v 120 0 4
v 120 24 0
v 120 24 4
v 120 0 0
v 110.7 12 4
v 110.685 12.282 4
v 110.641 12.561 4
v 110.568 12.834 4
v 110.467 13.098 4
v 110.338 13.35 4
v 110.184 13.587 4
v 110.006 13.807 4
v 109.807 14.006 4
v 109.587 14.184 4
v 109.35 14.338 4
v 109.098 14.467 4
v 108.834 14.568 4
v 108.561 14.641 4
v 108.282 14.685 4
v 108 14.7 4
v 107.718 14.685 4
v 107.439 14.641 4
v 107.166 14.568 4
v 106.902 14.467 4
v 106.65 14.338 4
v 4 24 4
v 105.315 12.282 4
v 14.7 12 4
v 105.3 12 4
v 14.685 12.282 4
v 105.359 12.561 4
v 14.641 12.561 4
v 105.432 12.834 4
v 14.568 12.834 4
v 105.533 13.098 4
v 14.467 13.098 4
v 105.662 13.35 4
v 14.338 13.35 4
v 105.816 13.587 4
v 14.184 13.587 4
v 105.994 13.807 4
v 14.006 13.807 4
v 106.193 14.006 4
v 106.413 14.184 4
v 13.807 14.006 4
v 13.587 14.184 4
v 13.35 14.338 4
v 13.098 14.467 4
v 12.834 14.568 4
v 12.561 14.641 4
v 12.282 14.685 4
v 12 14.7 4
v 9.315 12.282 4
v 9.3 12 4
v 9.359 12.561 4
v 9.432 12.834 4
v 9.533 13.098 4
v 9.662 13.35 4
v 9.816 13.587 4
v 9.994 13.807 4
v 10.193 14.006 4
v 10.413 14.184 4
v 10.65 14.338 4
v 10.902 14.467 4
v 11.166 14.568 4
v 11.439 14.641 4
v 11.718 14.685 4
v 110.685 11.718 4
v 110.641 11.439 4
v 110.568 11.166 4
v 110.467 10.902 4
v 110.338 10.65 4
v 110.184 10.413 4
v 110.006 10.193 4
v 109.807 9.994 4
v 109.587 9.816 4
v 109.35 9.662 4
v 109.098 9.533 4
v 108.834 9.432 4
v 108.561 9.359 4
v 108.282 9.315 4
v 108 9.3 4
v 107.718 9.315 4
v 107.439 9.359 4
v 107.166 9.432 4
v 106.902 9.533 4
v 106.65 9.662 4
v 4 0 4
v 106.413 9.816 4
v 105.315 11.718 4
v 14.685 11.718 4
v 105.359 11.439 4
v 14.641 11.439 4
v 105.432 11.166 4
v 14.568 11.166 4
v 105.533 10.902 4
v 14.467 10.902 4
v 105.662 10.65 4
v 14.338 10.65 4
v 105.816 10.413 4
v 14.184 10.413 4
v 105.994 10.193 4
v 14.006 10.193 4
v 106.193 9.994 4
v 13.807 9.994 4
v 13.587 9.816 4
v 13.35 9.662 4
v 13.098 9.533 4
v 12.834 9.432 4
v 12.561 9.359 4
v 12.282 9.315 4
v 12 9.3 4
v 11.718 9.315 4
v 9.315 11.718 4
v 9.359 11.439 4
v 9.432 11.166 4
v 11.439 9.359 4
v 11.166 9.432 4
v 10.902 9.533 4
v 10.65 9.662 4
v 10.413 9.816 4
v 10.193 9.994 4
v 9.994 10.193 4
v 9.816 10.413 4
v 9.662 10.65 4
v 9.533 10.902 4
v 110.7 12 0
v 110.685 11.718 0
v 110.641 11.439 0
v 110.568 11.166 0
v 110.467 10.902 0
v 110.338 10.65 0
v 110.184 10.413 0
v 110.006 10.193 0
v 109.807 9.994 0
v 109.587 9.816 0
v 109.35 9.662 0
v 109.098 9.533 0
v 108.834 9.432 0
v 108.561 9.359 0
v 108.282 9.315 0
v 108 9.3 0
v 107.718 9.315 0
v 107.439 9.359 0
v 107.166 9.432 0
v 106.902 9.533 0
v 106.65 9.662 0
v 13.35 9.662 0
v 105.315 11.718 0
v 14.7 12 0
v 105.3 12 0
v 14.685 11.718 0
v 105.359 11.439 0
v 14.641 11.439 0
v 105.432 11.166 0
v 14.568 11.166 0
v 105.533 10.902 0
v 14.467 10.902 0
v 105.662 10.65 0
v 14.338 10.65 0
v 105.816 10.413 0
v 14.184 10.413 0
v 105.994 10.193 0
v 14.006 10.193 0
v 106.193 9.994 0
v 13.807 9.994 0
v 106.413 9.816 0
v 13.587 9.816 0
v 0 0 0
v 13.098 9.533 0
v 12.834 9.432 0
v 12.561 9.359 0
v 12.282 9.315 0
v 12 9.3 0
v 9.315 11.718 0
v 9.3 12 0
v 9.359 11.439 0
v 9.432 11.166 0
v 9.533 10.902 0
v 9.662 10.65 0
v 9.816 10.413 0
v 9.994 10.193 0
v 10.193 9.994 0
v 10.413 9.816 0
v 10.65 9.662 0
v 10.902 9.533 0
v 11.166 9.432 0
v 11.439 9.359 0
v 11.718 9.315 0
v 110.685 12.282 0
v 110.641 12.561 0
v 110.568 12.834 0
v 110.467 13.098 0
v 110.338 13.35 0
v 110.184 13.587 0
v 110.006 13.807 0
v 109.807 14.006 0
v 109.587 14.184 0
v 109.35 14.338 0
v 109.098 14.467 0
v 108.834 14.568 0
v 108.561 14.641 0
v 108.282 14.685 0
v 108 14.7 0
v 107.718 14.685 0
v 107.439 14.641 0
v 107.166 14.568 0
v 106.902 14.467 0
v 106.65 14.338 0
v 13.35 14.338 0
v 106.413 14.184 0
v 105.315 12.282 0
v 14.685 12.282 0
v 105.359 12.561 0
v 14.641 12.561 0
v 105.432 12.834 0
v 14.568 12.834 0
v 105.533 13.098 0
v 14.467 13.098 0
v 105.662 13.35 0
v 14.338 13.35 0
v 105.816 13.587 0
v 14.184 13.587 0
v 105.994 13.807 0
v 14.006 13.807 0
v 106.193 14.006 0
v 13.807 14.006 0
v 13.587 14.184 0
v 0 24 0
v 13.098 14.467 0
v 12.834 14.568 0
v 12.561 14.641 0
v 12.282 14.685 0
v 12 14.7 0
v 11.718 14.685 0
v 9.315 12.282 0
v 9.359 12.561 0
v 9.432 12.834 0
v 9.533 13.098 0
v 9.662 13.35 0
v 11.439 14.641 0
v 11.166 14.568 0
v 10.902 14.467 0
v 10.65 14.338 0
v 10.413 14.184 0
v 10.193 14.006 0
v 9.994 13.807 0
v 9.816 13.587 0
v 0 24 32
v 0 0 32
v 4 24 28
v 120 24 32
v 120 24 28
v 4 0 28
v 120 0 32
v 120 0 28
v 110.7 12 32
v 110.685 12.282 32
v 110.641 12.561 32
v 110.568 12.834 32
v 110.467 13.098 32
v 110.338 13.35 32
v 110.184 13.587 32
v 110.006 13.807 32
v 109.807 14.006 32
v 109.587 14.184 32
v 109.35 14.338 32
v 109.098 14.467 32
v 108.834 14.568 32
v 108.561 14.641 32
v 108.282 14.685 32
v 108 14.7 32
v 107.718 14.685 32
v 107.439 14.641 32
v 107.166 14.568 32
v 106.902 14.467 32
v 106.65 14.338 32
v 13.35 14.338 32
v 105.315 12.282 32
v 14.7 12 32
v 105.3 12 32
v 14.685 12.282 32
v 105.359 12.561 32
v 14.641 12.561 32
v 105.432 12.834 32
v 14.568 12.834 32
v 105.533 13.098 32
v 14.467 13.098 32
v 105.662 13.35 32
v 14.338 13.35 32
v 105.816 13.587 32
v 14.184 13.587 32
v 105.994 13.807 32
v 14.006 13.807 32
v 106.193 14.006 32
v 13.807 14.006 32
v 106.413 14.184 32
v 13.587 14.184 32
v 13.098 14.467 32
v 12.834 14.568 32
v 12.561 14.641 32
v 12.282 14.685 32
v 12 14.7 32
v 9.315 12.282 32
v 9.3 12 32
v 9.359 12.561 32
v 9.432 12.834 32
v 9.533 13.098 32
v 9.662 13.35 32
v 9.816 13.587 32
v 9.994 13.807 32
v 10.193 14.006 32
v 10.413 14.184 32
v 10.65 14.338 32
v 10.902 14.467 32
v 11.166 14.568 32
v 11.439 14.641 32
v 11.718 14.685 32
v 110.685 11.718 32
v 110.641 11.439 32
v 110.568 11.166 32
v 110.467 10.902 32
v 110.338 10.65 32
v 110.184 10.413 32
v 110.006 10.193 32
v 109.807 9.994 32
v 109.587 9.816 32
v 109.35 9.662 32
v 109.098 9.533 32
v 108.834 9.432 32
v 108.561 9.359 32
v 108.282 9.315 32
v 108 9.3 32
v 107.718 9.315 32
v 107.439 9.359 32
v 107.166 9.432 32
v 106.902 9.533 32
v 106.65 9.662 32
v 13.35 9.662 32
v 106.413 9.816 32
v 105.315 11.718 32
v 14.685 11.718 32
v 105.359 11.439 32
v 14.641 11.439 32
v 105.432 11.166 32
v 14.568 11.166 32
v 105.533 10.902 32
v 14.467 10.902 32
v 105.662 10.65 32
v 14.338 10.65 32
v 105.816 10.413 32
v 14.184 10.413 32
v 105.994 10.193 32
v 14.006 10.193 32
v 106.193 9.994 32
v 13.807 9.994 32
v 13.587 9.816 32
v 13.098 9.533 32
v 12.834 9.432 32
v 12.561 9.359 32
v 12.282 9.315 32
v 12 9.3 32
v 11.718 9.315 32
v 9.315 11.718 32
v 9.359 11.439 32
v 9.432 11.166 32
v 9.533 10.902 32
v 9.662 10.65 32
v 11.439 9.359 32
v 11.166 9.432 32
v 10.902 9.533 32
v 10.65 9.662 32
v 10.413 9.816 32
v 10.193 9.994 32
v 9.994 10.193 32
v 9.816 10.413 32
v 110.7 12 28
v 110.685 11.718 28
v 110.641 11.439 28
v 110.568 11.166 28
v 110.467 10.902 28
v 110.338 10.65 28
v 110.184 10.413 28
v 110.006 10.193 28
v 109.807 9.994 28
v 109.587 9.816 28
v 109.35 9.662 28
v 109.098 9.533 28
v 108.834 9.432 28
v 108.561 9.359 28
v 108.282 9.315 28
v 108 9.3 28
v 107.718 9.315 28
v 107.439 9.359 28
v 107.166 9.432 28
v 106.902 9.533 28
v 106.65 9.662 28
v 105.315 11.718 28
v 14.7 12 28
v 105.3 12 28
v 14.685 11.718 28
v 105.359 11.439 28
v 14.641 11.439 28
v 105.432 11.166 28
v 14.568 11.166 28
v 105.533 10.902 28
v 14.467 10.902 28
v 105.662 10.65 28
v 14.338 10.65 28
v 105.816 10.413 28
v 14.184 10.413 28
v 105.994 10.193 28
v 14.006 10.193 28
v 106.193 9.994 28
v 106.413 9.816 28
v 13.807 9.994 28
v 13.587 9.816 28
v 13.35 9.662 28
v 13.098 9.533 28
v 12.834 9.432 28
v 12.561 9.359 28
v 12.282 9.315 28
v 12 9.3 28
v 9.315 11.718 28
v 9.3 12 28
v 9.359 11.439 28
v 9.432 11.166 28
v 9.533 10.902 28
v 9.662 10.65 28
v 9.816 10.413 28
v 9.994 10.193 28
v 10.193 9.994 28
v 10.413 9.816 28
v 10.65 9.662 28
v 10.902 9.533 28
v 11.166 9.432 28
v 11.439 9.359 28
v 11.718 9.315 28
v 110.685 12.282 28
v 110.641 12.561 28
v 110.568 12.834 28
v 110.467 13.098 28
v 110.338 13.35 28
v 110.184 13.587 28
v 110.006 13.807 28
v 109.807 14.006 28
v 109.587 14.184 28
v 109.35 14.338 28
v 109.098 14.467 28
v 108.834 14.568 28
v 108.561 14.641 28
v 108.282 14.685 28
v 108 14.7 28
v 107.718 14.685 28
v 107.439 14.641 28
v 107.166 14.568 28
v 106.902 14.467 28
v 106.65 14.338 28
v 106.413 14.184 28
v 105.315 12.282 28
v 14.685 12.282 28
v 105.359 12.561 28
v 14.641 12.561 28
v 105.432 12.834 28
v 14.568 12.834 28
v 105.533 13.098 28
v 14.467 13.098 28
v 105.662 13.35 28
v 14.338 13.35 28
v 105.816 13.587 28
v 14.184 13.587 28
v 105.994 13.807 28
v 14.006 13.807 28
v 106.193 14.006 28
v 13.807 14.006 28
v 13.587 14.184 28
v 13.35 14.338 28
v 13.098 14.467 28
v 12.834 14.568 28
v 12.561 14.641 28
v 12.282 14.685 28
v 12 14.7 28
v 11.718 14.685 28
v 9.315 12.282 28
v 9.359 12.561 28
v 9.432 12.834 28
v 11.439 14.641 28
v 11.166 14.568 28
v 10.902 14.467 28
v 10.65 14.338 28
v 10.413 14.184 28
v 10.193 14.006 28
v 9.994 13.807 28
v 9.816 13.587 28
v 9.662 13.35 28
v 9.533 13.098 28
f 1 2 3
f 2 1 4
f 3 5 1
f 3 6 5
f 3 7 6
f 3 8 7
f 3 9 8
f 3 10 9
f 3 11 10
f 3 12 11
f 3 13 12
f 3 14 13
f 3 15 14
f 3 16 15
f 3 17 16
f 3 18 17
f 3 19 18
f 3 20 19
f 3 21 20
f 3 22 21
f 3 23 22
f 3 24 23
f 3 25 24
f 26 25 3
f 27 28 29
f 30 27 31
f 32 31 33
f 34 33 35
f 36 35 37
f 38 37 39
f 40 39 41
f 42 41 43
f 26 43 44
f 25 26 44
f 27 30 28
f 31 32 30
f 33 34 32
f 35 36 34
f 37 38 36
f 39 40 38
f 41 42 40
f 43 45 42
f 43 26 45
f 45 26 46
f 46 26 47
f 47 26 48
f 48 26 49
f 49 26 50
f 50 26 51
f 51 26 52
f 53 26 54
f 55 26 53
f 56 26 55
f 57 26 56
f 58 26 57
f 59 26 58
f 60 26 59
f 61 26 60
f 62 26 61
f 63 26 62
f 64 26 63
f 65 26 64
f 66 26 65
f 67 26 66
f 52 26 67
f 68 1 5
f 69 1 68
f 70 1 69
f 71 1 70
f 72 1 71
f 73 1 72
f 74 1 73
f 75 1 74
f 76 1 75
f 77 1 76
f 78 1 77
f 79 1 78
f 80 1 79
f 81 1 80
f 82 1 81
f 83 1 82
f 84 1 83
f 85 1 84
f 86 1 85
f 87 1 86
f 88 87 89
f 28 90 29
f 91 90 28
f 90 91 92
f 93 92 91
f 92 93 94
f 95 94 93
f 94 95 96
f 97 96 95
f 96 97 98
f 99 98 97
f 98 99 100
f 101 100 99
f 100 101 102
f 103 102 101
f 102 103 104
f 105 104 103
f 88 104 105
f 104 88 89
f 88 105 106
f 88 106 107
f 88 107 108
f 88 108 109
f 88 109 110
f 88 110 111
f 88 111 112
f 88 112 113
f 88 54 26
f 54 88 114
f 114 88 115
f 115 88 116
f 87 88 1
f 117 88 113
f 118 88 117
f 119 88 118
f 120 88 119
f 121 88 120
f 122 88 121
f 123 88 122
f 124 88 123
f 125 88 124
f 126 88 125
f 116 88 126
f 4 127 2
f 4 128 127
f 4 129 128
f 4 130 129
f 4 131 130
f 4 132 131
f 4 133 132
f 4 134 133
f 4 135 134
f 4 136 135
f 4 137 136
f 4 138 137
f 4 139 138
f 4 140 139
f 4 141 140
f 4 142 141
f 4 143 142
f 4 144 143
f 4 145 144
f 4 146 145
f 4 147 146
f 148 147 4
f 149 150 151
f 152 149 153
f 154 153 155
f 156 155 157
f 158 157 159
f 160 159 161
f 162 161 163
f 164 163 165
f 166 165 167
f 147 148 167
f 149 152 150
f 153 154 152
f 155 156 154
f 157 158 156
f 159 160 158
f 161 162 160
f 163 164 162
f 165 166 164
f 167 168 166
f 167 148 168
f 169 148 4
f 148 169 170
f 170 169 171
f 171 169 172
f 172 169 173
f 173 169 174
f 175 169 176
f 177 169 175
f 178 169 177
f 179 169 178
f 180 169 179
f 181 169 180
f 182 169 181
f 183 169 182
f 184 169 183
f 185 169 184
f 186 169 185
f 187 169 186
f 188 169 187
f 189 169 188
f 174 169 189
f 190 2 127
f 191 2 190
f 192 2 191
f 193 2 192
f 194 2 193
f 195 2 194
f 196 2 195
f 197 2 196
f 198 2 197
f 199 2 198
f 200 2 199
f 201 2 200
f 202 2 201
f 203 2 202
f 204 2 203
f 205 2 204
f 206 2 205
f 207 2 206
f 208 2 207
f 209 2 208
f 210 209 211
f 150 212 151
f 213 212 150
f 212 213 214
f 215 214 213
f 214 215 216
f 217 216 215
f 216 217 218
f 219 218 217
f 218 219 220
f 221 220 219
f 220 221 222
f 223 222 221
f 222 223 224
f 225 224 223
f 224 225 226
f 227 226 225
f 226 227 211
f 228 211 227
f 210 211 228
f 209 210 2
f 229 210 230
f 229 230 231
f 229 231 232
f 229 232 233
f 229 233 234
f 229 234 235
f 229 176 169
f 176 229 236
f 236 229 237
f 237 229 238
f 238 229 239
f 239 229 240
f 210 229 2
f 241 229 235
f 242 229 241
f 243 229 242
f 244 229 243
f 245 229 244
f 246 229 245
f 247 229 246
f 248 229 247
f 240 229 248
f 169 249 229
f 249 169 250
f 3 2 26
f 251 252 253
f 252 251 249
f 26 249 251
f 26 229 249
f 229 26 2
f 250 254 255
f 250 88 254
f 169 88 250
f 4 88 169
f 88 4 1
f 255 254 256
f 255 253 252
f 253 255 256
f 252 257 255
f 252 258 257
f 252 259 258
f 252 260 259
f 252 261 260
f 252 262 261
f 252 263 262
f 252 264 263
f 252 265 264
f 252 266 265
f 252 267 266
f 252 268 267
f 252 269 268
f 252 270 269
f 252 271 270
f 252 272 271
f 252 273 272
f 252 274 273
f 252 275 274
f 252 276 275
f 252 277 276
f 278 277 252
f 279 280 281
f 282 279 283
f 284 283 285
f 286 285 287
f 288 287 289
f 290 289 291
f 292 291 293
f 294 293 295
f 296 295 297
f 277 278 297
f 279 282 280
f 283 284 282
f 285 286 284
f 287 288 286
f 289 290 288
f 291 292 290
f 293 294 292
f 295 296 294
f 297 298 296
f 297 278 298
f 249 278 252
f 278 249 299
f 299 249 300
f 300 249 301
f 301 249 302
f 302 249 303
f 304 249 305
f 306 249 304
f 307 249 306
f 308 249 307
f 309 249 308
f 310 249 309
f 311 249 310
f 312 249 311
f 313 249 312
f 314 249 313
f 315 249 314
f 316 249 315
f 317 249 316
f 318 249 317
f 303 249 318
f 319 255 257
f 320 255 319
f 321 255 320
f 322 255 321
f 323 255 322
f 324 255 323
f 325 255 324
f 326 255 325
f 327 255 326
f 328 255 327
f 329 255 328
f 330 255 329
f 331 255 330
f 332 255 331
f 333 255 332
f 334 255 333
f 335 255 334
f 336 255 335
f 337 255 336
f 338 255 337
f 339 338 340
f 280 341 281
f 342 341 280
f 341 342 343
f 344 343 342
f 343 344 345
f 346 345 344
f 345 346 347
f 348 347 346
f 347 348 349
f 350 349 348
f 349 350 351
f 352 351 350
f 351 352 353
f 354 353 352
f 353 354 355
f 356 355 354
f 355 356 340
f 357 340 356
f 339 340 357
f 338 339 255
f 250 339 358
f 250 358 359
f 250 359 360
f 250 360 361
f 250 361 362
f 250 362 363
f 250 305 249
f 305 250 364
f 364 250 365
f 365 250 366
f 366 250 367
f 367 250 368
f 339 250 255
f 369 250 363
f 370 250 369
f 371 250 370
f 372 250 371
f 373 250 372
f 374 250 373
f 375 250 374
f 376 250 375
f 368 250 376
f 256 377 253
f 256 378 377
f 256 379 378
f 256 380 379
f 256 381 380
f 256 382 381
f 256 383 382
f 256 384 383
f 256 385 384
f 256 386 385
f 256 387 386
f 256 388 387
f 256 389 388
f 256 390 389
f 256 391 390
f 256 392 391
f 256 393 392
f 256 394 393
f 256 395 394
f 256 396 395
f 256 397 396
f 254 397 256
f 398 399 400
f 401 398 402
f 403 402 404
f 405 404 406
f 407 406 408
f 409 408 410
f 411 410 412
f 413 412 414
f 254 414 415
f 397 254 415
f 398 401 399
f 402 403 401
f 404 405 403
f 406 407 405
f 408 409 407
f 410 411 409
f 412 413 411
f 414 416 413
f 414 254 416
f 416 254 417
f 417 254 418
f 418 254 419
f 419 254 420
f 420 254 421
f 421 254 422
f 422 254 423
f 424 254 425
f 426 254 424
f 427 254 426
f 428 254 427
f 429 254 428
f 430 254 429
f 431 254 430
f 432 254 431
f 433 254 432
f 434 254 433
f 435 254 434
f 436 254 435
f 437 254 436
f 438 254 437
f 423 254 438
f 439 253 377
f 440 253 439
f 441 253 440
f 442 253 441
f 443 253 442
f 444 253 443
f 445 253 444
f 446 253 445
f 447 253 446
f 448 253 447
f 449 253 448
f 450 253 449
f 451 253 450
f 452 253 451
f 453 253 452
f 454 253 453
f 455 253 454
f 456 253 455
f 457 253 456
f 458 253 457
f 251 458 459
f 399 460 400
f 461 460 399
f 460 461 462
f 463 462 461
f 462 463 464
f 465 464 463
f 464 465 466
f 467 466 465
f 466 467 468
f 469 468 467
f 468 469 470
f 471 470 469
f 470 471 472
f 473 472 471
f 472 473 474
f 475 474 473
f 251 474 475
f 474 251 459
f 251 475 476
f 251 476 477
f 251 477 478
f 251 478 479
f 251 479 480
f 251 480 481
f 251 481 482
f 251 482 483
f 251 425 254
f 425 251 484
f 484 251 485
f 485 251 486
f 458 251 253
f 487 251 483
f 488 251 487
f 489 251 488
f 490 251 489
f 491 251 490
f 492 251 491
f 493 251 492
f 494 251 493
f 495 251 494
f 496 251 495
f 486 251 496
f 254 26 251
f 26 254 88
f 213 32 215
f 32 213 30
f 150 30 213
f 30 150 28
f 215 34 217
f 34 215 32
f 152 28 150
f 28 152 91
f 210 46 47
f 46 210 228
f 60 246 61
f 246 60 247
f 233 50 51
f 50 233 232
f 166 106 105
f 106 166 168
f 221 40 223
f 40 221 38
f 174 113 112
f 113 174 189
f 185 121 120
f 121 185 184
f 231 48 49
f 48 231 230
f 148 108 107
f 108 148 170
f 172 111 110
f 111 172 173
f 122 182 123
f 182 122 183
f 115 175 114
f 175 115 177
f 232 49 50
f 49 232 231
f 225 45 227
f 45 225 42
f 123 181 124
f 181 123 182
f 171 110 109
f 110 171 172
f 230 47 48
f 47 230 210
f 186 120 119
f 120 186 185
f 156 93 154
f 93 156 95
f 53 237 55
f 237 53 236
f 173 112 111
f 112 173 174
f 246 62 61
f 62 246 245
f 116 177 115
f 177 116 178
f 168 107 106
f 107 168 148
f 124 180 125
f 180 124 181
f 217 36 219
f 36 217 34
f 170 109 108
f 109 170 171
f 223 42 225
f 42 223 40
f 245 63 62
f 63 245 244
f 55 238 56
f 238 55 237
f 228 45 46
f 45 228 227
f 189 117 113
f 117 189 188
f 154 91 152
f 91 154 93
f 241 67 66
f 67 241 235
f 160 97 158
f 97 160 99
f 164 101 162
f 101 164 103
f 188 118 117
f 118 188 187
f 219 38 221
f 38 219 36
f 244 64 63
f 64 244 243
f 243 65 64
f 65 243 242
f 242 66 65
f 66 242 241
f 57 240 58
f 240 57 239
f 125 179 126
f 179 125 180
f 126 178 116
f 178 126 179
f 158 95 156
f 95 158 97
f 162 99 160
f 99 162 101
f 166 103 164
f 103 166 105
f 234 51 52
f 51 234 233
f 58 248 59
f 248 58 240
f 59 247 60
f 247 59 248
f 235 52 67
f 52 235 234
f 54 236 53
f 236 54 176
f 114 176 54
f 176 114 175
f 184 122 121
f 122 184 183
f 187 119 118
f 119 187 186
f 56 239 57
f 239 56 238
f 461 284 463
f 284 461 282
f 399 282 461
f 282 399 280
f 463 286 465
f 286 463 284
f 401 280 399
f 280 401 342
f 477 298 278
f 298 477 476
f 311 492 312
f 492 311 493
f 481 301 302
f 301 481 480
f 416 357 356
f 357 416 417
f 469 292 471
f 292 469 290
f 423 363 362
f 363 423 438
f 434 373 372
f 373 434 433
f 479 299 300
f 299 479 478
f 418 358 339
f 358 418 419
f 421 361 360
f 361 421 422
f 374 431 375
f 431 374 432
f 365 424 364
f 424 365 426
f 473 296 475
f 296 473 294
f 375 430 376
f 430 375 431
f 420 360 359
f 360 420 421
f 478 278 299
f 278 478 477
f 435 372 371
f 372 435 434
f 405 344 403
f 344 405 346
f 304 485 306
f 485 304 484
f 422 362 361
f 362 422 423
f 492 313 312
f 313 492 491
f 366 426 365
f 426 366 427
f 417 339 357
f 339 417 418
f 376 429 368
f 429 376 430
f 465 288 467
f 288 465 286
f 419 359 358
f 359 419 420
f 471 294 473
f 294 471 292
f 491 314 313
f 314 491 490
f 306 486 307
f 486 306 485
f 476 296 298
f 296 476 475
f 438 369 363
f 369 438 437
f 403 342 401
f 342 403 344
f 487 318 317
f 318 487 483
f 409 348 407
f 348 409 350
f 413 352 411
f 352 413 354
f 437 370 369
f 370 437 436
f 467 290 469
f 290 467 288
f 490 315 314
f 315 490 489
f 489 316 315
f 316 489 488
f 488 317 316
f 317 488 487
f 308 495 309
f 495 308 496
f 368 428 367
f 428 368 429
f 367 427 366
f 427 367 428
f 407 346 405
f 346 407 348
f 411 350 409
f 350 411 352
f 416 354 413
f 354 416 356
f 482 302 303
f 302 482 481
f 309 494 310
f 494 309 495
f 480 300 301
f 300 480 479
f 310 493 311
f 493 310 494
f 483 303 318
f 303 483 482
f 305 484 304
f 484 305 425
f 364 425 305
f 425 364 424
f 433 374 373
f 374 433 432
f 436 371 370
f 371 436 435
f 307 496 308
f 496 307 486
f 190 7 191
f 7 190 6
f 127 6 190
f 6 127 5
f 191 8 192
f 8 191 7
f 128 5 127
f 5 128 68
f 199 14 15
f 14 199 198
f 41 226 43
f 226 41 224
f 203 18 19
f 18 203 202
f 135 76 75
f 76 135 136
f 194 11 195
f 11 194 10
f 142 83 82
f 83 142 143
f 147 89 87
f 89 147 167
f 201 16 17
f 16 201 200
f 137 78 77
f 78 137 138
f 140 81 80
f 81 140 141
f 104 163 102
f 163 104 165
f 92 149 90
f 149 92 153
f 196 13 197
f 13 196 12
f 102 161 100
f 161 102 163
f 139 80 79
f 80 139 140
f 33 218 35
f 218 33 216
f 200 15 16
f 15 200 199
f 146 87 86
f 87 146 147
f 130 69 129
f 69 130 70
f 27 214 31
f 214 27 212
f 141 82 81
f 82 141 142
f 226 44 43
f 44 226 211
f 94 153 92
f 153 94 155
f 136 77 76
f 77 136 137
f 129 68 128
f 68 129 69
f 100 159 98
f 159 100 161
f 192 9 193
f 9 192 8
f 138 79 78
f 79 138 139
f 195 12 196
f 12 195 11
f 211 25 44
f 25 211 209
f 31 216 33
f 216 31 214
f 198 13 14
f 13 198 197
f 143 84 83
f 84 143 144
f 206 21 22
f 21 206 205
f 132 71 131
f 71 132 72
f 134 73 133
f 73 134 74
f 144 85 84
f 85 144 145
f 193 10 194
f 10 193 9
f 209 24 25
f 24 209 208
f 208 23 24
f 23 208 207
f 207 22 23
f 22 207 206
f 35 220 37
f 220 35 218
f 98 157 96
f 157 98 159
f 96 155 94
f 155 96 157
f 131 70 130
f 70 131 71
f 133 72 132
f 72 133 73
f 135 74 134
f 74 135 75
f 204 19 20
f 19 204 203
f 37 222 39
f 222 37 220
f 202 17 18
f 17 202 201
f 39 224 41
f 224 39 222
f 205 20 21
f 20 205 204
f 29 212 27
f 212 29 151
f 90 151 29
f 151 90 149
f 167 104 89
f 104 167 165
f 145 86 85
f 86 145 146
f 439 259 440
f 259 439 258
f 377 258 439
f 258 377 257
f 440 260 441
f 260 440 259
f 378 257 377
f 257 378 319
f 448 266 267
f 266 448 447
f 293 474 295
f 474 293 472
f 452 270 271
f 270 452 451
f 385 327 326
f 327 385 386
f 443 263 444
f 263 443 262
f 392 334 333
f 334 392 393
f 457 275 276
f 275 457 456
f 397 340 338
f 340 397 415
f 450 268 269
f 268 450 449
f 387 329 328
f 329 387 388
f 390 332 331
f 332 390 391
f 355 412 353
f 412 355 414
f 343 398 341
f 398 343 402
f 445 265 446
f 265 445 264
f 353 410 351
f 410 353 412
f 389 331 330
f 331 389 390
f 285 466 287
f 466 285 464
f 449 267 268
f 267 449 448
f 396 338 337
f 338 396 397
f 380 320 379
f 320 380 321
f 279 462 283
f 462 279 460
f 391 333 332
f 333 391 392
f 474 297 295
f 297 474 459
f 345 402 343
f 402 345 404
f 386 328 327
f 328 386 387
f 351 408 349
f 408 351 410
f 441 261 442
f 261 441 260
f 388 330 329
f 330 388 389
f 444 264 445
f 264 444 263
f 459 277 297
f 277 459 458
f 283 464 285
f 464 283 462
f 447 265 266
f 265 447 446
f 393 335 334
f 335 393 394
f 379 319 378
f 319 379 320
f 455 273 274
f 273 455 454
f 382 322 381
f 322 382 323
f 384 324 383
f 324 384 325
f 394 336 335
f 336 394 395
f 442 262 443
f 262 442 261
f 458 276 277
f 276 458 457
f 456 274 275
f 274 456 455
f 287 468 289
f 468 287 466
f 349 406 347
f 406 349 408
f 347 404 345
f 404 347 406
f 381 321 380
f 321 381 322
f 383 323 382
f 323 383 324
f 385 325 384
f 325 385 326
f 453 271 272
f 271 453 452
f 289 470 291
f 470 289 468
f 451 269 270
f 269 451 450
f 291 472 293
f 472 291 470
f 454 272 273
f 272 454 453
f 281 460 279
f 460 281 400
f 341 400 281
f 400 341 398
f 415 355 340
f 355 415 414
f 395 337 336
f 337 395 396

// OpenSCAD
// Z-offset mounting bracket.
$fn = 60;
eps = 0.02;
length = 120;
height = 28;
width = 24;
thickness = 4;
difference() {
    union() {
        cube([length,width,thickness]);
        translate([0,0,height]) cube([length,width,thickness]);
        translate([0,0,thickness]) cube([thickness,width,height-thickness]);
    }
    for (x=[12,length-12]) {
        translate([x,width/2,-eps]) cylinder(d=5.4,h=thickness+2*eps);
        translate([x,width/2,height-eps]) cylinder(d=5.4,h=thickness+2*eps);
    }
}
